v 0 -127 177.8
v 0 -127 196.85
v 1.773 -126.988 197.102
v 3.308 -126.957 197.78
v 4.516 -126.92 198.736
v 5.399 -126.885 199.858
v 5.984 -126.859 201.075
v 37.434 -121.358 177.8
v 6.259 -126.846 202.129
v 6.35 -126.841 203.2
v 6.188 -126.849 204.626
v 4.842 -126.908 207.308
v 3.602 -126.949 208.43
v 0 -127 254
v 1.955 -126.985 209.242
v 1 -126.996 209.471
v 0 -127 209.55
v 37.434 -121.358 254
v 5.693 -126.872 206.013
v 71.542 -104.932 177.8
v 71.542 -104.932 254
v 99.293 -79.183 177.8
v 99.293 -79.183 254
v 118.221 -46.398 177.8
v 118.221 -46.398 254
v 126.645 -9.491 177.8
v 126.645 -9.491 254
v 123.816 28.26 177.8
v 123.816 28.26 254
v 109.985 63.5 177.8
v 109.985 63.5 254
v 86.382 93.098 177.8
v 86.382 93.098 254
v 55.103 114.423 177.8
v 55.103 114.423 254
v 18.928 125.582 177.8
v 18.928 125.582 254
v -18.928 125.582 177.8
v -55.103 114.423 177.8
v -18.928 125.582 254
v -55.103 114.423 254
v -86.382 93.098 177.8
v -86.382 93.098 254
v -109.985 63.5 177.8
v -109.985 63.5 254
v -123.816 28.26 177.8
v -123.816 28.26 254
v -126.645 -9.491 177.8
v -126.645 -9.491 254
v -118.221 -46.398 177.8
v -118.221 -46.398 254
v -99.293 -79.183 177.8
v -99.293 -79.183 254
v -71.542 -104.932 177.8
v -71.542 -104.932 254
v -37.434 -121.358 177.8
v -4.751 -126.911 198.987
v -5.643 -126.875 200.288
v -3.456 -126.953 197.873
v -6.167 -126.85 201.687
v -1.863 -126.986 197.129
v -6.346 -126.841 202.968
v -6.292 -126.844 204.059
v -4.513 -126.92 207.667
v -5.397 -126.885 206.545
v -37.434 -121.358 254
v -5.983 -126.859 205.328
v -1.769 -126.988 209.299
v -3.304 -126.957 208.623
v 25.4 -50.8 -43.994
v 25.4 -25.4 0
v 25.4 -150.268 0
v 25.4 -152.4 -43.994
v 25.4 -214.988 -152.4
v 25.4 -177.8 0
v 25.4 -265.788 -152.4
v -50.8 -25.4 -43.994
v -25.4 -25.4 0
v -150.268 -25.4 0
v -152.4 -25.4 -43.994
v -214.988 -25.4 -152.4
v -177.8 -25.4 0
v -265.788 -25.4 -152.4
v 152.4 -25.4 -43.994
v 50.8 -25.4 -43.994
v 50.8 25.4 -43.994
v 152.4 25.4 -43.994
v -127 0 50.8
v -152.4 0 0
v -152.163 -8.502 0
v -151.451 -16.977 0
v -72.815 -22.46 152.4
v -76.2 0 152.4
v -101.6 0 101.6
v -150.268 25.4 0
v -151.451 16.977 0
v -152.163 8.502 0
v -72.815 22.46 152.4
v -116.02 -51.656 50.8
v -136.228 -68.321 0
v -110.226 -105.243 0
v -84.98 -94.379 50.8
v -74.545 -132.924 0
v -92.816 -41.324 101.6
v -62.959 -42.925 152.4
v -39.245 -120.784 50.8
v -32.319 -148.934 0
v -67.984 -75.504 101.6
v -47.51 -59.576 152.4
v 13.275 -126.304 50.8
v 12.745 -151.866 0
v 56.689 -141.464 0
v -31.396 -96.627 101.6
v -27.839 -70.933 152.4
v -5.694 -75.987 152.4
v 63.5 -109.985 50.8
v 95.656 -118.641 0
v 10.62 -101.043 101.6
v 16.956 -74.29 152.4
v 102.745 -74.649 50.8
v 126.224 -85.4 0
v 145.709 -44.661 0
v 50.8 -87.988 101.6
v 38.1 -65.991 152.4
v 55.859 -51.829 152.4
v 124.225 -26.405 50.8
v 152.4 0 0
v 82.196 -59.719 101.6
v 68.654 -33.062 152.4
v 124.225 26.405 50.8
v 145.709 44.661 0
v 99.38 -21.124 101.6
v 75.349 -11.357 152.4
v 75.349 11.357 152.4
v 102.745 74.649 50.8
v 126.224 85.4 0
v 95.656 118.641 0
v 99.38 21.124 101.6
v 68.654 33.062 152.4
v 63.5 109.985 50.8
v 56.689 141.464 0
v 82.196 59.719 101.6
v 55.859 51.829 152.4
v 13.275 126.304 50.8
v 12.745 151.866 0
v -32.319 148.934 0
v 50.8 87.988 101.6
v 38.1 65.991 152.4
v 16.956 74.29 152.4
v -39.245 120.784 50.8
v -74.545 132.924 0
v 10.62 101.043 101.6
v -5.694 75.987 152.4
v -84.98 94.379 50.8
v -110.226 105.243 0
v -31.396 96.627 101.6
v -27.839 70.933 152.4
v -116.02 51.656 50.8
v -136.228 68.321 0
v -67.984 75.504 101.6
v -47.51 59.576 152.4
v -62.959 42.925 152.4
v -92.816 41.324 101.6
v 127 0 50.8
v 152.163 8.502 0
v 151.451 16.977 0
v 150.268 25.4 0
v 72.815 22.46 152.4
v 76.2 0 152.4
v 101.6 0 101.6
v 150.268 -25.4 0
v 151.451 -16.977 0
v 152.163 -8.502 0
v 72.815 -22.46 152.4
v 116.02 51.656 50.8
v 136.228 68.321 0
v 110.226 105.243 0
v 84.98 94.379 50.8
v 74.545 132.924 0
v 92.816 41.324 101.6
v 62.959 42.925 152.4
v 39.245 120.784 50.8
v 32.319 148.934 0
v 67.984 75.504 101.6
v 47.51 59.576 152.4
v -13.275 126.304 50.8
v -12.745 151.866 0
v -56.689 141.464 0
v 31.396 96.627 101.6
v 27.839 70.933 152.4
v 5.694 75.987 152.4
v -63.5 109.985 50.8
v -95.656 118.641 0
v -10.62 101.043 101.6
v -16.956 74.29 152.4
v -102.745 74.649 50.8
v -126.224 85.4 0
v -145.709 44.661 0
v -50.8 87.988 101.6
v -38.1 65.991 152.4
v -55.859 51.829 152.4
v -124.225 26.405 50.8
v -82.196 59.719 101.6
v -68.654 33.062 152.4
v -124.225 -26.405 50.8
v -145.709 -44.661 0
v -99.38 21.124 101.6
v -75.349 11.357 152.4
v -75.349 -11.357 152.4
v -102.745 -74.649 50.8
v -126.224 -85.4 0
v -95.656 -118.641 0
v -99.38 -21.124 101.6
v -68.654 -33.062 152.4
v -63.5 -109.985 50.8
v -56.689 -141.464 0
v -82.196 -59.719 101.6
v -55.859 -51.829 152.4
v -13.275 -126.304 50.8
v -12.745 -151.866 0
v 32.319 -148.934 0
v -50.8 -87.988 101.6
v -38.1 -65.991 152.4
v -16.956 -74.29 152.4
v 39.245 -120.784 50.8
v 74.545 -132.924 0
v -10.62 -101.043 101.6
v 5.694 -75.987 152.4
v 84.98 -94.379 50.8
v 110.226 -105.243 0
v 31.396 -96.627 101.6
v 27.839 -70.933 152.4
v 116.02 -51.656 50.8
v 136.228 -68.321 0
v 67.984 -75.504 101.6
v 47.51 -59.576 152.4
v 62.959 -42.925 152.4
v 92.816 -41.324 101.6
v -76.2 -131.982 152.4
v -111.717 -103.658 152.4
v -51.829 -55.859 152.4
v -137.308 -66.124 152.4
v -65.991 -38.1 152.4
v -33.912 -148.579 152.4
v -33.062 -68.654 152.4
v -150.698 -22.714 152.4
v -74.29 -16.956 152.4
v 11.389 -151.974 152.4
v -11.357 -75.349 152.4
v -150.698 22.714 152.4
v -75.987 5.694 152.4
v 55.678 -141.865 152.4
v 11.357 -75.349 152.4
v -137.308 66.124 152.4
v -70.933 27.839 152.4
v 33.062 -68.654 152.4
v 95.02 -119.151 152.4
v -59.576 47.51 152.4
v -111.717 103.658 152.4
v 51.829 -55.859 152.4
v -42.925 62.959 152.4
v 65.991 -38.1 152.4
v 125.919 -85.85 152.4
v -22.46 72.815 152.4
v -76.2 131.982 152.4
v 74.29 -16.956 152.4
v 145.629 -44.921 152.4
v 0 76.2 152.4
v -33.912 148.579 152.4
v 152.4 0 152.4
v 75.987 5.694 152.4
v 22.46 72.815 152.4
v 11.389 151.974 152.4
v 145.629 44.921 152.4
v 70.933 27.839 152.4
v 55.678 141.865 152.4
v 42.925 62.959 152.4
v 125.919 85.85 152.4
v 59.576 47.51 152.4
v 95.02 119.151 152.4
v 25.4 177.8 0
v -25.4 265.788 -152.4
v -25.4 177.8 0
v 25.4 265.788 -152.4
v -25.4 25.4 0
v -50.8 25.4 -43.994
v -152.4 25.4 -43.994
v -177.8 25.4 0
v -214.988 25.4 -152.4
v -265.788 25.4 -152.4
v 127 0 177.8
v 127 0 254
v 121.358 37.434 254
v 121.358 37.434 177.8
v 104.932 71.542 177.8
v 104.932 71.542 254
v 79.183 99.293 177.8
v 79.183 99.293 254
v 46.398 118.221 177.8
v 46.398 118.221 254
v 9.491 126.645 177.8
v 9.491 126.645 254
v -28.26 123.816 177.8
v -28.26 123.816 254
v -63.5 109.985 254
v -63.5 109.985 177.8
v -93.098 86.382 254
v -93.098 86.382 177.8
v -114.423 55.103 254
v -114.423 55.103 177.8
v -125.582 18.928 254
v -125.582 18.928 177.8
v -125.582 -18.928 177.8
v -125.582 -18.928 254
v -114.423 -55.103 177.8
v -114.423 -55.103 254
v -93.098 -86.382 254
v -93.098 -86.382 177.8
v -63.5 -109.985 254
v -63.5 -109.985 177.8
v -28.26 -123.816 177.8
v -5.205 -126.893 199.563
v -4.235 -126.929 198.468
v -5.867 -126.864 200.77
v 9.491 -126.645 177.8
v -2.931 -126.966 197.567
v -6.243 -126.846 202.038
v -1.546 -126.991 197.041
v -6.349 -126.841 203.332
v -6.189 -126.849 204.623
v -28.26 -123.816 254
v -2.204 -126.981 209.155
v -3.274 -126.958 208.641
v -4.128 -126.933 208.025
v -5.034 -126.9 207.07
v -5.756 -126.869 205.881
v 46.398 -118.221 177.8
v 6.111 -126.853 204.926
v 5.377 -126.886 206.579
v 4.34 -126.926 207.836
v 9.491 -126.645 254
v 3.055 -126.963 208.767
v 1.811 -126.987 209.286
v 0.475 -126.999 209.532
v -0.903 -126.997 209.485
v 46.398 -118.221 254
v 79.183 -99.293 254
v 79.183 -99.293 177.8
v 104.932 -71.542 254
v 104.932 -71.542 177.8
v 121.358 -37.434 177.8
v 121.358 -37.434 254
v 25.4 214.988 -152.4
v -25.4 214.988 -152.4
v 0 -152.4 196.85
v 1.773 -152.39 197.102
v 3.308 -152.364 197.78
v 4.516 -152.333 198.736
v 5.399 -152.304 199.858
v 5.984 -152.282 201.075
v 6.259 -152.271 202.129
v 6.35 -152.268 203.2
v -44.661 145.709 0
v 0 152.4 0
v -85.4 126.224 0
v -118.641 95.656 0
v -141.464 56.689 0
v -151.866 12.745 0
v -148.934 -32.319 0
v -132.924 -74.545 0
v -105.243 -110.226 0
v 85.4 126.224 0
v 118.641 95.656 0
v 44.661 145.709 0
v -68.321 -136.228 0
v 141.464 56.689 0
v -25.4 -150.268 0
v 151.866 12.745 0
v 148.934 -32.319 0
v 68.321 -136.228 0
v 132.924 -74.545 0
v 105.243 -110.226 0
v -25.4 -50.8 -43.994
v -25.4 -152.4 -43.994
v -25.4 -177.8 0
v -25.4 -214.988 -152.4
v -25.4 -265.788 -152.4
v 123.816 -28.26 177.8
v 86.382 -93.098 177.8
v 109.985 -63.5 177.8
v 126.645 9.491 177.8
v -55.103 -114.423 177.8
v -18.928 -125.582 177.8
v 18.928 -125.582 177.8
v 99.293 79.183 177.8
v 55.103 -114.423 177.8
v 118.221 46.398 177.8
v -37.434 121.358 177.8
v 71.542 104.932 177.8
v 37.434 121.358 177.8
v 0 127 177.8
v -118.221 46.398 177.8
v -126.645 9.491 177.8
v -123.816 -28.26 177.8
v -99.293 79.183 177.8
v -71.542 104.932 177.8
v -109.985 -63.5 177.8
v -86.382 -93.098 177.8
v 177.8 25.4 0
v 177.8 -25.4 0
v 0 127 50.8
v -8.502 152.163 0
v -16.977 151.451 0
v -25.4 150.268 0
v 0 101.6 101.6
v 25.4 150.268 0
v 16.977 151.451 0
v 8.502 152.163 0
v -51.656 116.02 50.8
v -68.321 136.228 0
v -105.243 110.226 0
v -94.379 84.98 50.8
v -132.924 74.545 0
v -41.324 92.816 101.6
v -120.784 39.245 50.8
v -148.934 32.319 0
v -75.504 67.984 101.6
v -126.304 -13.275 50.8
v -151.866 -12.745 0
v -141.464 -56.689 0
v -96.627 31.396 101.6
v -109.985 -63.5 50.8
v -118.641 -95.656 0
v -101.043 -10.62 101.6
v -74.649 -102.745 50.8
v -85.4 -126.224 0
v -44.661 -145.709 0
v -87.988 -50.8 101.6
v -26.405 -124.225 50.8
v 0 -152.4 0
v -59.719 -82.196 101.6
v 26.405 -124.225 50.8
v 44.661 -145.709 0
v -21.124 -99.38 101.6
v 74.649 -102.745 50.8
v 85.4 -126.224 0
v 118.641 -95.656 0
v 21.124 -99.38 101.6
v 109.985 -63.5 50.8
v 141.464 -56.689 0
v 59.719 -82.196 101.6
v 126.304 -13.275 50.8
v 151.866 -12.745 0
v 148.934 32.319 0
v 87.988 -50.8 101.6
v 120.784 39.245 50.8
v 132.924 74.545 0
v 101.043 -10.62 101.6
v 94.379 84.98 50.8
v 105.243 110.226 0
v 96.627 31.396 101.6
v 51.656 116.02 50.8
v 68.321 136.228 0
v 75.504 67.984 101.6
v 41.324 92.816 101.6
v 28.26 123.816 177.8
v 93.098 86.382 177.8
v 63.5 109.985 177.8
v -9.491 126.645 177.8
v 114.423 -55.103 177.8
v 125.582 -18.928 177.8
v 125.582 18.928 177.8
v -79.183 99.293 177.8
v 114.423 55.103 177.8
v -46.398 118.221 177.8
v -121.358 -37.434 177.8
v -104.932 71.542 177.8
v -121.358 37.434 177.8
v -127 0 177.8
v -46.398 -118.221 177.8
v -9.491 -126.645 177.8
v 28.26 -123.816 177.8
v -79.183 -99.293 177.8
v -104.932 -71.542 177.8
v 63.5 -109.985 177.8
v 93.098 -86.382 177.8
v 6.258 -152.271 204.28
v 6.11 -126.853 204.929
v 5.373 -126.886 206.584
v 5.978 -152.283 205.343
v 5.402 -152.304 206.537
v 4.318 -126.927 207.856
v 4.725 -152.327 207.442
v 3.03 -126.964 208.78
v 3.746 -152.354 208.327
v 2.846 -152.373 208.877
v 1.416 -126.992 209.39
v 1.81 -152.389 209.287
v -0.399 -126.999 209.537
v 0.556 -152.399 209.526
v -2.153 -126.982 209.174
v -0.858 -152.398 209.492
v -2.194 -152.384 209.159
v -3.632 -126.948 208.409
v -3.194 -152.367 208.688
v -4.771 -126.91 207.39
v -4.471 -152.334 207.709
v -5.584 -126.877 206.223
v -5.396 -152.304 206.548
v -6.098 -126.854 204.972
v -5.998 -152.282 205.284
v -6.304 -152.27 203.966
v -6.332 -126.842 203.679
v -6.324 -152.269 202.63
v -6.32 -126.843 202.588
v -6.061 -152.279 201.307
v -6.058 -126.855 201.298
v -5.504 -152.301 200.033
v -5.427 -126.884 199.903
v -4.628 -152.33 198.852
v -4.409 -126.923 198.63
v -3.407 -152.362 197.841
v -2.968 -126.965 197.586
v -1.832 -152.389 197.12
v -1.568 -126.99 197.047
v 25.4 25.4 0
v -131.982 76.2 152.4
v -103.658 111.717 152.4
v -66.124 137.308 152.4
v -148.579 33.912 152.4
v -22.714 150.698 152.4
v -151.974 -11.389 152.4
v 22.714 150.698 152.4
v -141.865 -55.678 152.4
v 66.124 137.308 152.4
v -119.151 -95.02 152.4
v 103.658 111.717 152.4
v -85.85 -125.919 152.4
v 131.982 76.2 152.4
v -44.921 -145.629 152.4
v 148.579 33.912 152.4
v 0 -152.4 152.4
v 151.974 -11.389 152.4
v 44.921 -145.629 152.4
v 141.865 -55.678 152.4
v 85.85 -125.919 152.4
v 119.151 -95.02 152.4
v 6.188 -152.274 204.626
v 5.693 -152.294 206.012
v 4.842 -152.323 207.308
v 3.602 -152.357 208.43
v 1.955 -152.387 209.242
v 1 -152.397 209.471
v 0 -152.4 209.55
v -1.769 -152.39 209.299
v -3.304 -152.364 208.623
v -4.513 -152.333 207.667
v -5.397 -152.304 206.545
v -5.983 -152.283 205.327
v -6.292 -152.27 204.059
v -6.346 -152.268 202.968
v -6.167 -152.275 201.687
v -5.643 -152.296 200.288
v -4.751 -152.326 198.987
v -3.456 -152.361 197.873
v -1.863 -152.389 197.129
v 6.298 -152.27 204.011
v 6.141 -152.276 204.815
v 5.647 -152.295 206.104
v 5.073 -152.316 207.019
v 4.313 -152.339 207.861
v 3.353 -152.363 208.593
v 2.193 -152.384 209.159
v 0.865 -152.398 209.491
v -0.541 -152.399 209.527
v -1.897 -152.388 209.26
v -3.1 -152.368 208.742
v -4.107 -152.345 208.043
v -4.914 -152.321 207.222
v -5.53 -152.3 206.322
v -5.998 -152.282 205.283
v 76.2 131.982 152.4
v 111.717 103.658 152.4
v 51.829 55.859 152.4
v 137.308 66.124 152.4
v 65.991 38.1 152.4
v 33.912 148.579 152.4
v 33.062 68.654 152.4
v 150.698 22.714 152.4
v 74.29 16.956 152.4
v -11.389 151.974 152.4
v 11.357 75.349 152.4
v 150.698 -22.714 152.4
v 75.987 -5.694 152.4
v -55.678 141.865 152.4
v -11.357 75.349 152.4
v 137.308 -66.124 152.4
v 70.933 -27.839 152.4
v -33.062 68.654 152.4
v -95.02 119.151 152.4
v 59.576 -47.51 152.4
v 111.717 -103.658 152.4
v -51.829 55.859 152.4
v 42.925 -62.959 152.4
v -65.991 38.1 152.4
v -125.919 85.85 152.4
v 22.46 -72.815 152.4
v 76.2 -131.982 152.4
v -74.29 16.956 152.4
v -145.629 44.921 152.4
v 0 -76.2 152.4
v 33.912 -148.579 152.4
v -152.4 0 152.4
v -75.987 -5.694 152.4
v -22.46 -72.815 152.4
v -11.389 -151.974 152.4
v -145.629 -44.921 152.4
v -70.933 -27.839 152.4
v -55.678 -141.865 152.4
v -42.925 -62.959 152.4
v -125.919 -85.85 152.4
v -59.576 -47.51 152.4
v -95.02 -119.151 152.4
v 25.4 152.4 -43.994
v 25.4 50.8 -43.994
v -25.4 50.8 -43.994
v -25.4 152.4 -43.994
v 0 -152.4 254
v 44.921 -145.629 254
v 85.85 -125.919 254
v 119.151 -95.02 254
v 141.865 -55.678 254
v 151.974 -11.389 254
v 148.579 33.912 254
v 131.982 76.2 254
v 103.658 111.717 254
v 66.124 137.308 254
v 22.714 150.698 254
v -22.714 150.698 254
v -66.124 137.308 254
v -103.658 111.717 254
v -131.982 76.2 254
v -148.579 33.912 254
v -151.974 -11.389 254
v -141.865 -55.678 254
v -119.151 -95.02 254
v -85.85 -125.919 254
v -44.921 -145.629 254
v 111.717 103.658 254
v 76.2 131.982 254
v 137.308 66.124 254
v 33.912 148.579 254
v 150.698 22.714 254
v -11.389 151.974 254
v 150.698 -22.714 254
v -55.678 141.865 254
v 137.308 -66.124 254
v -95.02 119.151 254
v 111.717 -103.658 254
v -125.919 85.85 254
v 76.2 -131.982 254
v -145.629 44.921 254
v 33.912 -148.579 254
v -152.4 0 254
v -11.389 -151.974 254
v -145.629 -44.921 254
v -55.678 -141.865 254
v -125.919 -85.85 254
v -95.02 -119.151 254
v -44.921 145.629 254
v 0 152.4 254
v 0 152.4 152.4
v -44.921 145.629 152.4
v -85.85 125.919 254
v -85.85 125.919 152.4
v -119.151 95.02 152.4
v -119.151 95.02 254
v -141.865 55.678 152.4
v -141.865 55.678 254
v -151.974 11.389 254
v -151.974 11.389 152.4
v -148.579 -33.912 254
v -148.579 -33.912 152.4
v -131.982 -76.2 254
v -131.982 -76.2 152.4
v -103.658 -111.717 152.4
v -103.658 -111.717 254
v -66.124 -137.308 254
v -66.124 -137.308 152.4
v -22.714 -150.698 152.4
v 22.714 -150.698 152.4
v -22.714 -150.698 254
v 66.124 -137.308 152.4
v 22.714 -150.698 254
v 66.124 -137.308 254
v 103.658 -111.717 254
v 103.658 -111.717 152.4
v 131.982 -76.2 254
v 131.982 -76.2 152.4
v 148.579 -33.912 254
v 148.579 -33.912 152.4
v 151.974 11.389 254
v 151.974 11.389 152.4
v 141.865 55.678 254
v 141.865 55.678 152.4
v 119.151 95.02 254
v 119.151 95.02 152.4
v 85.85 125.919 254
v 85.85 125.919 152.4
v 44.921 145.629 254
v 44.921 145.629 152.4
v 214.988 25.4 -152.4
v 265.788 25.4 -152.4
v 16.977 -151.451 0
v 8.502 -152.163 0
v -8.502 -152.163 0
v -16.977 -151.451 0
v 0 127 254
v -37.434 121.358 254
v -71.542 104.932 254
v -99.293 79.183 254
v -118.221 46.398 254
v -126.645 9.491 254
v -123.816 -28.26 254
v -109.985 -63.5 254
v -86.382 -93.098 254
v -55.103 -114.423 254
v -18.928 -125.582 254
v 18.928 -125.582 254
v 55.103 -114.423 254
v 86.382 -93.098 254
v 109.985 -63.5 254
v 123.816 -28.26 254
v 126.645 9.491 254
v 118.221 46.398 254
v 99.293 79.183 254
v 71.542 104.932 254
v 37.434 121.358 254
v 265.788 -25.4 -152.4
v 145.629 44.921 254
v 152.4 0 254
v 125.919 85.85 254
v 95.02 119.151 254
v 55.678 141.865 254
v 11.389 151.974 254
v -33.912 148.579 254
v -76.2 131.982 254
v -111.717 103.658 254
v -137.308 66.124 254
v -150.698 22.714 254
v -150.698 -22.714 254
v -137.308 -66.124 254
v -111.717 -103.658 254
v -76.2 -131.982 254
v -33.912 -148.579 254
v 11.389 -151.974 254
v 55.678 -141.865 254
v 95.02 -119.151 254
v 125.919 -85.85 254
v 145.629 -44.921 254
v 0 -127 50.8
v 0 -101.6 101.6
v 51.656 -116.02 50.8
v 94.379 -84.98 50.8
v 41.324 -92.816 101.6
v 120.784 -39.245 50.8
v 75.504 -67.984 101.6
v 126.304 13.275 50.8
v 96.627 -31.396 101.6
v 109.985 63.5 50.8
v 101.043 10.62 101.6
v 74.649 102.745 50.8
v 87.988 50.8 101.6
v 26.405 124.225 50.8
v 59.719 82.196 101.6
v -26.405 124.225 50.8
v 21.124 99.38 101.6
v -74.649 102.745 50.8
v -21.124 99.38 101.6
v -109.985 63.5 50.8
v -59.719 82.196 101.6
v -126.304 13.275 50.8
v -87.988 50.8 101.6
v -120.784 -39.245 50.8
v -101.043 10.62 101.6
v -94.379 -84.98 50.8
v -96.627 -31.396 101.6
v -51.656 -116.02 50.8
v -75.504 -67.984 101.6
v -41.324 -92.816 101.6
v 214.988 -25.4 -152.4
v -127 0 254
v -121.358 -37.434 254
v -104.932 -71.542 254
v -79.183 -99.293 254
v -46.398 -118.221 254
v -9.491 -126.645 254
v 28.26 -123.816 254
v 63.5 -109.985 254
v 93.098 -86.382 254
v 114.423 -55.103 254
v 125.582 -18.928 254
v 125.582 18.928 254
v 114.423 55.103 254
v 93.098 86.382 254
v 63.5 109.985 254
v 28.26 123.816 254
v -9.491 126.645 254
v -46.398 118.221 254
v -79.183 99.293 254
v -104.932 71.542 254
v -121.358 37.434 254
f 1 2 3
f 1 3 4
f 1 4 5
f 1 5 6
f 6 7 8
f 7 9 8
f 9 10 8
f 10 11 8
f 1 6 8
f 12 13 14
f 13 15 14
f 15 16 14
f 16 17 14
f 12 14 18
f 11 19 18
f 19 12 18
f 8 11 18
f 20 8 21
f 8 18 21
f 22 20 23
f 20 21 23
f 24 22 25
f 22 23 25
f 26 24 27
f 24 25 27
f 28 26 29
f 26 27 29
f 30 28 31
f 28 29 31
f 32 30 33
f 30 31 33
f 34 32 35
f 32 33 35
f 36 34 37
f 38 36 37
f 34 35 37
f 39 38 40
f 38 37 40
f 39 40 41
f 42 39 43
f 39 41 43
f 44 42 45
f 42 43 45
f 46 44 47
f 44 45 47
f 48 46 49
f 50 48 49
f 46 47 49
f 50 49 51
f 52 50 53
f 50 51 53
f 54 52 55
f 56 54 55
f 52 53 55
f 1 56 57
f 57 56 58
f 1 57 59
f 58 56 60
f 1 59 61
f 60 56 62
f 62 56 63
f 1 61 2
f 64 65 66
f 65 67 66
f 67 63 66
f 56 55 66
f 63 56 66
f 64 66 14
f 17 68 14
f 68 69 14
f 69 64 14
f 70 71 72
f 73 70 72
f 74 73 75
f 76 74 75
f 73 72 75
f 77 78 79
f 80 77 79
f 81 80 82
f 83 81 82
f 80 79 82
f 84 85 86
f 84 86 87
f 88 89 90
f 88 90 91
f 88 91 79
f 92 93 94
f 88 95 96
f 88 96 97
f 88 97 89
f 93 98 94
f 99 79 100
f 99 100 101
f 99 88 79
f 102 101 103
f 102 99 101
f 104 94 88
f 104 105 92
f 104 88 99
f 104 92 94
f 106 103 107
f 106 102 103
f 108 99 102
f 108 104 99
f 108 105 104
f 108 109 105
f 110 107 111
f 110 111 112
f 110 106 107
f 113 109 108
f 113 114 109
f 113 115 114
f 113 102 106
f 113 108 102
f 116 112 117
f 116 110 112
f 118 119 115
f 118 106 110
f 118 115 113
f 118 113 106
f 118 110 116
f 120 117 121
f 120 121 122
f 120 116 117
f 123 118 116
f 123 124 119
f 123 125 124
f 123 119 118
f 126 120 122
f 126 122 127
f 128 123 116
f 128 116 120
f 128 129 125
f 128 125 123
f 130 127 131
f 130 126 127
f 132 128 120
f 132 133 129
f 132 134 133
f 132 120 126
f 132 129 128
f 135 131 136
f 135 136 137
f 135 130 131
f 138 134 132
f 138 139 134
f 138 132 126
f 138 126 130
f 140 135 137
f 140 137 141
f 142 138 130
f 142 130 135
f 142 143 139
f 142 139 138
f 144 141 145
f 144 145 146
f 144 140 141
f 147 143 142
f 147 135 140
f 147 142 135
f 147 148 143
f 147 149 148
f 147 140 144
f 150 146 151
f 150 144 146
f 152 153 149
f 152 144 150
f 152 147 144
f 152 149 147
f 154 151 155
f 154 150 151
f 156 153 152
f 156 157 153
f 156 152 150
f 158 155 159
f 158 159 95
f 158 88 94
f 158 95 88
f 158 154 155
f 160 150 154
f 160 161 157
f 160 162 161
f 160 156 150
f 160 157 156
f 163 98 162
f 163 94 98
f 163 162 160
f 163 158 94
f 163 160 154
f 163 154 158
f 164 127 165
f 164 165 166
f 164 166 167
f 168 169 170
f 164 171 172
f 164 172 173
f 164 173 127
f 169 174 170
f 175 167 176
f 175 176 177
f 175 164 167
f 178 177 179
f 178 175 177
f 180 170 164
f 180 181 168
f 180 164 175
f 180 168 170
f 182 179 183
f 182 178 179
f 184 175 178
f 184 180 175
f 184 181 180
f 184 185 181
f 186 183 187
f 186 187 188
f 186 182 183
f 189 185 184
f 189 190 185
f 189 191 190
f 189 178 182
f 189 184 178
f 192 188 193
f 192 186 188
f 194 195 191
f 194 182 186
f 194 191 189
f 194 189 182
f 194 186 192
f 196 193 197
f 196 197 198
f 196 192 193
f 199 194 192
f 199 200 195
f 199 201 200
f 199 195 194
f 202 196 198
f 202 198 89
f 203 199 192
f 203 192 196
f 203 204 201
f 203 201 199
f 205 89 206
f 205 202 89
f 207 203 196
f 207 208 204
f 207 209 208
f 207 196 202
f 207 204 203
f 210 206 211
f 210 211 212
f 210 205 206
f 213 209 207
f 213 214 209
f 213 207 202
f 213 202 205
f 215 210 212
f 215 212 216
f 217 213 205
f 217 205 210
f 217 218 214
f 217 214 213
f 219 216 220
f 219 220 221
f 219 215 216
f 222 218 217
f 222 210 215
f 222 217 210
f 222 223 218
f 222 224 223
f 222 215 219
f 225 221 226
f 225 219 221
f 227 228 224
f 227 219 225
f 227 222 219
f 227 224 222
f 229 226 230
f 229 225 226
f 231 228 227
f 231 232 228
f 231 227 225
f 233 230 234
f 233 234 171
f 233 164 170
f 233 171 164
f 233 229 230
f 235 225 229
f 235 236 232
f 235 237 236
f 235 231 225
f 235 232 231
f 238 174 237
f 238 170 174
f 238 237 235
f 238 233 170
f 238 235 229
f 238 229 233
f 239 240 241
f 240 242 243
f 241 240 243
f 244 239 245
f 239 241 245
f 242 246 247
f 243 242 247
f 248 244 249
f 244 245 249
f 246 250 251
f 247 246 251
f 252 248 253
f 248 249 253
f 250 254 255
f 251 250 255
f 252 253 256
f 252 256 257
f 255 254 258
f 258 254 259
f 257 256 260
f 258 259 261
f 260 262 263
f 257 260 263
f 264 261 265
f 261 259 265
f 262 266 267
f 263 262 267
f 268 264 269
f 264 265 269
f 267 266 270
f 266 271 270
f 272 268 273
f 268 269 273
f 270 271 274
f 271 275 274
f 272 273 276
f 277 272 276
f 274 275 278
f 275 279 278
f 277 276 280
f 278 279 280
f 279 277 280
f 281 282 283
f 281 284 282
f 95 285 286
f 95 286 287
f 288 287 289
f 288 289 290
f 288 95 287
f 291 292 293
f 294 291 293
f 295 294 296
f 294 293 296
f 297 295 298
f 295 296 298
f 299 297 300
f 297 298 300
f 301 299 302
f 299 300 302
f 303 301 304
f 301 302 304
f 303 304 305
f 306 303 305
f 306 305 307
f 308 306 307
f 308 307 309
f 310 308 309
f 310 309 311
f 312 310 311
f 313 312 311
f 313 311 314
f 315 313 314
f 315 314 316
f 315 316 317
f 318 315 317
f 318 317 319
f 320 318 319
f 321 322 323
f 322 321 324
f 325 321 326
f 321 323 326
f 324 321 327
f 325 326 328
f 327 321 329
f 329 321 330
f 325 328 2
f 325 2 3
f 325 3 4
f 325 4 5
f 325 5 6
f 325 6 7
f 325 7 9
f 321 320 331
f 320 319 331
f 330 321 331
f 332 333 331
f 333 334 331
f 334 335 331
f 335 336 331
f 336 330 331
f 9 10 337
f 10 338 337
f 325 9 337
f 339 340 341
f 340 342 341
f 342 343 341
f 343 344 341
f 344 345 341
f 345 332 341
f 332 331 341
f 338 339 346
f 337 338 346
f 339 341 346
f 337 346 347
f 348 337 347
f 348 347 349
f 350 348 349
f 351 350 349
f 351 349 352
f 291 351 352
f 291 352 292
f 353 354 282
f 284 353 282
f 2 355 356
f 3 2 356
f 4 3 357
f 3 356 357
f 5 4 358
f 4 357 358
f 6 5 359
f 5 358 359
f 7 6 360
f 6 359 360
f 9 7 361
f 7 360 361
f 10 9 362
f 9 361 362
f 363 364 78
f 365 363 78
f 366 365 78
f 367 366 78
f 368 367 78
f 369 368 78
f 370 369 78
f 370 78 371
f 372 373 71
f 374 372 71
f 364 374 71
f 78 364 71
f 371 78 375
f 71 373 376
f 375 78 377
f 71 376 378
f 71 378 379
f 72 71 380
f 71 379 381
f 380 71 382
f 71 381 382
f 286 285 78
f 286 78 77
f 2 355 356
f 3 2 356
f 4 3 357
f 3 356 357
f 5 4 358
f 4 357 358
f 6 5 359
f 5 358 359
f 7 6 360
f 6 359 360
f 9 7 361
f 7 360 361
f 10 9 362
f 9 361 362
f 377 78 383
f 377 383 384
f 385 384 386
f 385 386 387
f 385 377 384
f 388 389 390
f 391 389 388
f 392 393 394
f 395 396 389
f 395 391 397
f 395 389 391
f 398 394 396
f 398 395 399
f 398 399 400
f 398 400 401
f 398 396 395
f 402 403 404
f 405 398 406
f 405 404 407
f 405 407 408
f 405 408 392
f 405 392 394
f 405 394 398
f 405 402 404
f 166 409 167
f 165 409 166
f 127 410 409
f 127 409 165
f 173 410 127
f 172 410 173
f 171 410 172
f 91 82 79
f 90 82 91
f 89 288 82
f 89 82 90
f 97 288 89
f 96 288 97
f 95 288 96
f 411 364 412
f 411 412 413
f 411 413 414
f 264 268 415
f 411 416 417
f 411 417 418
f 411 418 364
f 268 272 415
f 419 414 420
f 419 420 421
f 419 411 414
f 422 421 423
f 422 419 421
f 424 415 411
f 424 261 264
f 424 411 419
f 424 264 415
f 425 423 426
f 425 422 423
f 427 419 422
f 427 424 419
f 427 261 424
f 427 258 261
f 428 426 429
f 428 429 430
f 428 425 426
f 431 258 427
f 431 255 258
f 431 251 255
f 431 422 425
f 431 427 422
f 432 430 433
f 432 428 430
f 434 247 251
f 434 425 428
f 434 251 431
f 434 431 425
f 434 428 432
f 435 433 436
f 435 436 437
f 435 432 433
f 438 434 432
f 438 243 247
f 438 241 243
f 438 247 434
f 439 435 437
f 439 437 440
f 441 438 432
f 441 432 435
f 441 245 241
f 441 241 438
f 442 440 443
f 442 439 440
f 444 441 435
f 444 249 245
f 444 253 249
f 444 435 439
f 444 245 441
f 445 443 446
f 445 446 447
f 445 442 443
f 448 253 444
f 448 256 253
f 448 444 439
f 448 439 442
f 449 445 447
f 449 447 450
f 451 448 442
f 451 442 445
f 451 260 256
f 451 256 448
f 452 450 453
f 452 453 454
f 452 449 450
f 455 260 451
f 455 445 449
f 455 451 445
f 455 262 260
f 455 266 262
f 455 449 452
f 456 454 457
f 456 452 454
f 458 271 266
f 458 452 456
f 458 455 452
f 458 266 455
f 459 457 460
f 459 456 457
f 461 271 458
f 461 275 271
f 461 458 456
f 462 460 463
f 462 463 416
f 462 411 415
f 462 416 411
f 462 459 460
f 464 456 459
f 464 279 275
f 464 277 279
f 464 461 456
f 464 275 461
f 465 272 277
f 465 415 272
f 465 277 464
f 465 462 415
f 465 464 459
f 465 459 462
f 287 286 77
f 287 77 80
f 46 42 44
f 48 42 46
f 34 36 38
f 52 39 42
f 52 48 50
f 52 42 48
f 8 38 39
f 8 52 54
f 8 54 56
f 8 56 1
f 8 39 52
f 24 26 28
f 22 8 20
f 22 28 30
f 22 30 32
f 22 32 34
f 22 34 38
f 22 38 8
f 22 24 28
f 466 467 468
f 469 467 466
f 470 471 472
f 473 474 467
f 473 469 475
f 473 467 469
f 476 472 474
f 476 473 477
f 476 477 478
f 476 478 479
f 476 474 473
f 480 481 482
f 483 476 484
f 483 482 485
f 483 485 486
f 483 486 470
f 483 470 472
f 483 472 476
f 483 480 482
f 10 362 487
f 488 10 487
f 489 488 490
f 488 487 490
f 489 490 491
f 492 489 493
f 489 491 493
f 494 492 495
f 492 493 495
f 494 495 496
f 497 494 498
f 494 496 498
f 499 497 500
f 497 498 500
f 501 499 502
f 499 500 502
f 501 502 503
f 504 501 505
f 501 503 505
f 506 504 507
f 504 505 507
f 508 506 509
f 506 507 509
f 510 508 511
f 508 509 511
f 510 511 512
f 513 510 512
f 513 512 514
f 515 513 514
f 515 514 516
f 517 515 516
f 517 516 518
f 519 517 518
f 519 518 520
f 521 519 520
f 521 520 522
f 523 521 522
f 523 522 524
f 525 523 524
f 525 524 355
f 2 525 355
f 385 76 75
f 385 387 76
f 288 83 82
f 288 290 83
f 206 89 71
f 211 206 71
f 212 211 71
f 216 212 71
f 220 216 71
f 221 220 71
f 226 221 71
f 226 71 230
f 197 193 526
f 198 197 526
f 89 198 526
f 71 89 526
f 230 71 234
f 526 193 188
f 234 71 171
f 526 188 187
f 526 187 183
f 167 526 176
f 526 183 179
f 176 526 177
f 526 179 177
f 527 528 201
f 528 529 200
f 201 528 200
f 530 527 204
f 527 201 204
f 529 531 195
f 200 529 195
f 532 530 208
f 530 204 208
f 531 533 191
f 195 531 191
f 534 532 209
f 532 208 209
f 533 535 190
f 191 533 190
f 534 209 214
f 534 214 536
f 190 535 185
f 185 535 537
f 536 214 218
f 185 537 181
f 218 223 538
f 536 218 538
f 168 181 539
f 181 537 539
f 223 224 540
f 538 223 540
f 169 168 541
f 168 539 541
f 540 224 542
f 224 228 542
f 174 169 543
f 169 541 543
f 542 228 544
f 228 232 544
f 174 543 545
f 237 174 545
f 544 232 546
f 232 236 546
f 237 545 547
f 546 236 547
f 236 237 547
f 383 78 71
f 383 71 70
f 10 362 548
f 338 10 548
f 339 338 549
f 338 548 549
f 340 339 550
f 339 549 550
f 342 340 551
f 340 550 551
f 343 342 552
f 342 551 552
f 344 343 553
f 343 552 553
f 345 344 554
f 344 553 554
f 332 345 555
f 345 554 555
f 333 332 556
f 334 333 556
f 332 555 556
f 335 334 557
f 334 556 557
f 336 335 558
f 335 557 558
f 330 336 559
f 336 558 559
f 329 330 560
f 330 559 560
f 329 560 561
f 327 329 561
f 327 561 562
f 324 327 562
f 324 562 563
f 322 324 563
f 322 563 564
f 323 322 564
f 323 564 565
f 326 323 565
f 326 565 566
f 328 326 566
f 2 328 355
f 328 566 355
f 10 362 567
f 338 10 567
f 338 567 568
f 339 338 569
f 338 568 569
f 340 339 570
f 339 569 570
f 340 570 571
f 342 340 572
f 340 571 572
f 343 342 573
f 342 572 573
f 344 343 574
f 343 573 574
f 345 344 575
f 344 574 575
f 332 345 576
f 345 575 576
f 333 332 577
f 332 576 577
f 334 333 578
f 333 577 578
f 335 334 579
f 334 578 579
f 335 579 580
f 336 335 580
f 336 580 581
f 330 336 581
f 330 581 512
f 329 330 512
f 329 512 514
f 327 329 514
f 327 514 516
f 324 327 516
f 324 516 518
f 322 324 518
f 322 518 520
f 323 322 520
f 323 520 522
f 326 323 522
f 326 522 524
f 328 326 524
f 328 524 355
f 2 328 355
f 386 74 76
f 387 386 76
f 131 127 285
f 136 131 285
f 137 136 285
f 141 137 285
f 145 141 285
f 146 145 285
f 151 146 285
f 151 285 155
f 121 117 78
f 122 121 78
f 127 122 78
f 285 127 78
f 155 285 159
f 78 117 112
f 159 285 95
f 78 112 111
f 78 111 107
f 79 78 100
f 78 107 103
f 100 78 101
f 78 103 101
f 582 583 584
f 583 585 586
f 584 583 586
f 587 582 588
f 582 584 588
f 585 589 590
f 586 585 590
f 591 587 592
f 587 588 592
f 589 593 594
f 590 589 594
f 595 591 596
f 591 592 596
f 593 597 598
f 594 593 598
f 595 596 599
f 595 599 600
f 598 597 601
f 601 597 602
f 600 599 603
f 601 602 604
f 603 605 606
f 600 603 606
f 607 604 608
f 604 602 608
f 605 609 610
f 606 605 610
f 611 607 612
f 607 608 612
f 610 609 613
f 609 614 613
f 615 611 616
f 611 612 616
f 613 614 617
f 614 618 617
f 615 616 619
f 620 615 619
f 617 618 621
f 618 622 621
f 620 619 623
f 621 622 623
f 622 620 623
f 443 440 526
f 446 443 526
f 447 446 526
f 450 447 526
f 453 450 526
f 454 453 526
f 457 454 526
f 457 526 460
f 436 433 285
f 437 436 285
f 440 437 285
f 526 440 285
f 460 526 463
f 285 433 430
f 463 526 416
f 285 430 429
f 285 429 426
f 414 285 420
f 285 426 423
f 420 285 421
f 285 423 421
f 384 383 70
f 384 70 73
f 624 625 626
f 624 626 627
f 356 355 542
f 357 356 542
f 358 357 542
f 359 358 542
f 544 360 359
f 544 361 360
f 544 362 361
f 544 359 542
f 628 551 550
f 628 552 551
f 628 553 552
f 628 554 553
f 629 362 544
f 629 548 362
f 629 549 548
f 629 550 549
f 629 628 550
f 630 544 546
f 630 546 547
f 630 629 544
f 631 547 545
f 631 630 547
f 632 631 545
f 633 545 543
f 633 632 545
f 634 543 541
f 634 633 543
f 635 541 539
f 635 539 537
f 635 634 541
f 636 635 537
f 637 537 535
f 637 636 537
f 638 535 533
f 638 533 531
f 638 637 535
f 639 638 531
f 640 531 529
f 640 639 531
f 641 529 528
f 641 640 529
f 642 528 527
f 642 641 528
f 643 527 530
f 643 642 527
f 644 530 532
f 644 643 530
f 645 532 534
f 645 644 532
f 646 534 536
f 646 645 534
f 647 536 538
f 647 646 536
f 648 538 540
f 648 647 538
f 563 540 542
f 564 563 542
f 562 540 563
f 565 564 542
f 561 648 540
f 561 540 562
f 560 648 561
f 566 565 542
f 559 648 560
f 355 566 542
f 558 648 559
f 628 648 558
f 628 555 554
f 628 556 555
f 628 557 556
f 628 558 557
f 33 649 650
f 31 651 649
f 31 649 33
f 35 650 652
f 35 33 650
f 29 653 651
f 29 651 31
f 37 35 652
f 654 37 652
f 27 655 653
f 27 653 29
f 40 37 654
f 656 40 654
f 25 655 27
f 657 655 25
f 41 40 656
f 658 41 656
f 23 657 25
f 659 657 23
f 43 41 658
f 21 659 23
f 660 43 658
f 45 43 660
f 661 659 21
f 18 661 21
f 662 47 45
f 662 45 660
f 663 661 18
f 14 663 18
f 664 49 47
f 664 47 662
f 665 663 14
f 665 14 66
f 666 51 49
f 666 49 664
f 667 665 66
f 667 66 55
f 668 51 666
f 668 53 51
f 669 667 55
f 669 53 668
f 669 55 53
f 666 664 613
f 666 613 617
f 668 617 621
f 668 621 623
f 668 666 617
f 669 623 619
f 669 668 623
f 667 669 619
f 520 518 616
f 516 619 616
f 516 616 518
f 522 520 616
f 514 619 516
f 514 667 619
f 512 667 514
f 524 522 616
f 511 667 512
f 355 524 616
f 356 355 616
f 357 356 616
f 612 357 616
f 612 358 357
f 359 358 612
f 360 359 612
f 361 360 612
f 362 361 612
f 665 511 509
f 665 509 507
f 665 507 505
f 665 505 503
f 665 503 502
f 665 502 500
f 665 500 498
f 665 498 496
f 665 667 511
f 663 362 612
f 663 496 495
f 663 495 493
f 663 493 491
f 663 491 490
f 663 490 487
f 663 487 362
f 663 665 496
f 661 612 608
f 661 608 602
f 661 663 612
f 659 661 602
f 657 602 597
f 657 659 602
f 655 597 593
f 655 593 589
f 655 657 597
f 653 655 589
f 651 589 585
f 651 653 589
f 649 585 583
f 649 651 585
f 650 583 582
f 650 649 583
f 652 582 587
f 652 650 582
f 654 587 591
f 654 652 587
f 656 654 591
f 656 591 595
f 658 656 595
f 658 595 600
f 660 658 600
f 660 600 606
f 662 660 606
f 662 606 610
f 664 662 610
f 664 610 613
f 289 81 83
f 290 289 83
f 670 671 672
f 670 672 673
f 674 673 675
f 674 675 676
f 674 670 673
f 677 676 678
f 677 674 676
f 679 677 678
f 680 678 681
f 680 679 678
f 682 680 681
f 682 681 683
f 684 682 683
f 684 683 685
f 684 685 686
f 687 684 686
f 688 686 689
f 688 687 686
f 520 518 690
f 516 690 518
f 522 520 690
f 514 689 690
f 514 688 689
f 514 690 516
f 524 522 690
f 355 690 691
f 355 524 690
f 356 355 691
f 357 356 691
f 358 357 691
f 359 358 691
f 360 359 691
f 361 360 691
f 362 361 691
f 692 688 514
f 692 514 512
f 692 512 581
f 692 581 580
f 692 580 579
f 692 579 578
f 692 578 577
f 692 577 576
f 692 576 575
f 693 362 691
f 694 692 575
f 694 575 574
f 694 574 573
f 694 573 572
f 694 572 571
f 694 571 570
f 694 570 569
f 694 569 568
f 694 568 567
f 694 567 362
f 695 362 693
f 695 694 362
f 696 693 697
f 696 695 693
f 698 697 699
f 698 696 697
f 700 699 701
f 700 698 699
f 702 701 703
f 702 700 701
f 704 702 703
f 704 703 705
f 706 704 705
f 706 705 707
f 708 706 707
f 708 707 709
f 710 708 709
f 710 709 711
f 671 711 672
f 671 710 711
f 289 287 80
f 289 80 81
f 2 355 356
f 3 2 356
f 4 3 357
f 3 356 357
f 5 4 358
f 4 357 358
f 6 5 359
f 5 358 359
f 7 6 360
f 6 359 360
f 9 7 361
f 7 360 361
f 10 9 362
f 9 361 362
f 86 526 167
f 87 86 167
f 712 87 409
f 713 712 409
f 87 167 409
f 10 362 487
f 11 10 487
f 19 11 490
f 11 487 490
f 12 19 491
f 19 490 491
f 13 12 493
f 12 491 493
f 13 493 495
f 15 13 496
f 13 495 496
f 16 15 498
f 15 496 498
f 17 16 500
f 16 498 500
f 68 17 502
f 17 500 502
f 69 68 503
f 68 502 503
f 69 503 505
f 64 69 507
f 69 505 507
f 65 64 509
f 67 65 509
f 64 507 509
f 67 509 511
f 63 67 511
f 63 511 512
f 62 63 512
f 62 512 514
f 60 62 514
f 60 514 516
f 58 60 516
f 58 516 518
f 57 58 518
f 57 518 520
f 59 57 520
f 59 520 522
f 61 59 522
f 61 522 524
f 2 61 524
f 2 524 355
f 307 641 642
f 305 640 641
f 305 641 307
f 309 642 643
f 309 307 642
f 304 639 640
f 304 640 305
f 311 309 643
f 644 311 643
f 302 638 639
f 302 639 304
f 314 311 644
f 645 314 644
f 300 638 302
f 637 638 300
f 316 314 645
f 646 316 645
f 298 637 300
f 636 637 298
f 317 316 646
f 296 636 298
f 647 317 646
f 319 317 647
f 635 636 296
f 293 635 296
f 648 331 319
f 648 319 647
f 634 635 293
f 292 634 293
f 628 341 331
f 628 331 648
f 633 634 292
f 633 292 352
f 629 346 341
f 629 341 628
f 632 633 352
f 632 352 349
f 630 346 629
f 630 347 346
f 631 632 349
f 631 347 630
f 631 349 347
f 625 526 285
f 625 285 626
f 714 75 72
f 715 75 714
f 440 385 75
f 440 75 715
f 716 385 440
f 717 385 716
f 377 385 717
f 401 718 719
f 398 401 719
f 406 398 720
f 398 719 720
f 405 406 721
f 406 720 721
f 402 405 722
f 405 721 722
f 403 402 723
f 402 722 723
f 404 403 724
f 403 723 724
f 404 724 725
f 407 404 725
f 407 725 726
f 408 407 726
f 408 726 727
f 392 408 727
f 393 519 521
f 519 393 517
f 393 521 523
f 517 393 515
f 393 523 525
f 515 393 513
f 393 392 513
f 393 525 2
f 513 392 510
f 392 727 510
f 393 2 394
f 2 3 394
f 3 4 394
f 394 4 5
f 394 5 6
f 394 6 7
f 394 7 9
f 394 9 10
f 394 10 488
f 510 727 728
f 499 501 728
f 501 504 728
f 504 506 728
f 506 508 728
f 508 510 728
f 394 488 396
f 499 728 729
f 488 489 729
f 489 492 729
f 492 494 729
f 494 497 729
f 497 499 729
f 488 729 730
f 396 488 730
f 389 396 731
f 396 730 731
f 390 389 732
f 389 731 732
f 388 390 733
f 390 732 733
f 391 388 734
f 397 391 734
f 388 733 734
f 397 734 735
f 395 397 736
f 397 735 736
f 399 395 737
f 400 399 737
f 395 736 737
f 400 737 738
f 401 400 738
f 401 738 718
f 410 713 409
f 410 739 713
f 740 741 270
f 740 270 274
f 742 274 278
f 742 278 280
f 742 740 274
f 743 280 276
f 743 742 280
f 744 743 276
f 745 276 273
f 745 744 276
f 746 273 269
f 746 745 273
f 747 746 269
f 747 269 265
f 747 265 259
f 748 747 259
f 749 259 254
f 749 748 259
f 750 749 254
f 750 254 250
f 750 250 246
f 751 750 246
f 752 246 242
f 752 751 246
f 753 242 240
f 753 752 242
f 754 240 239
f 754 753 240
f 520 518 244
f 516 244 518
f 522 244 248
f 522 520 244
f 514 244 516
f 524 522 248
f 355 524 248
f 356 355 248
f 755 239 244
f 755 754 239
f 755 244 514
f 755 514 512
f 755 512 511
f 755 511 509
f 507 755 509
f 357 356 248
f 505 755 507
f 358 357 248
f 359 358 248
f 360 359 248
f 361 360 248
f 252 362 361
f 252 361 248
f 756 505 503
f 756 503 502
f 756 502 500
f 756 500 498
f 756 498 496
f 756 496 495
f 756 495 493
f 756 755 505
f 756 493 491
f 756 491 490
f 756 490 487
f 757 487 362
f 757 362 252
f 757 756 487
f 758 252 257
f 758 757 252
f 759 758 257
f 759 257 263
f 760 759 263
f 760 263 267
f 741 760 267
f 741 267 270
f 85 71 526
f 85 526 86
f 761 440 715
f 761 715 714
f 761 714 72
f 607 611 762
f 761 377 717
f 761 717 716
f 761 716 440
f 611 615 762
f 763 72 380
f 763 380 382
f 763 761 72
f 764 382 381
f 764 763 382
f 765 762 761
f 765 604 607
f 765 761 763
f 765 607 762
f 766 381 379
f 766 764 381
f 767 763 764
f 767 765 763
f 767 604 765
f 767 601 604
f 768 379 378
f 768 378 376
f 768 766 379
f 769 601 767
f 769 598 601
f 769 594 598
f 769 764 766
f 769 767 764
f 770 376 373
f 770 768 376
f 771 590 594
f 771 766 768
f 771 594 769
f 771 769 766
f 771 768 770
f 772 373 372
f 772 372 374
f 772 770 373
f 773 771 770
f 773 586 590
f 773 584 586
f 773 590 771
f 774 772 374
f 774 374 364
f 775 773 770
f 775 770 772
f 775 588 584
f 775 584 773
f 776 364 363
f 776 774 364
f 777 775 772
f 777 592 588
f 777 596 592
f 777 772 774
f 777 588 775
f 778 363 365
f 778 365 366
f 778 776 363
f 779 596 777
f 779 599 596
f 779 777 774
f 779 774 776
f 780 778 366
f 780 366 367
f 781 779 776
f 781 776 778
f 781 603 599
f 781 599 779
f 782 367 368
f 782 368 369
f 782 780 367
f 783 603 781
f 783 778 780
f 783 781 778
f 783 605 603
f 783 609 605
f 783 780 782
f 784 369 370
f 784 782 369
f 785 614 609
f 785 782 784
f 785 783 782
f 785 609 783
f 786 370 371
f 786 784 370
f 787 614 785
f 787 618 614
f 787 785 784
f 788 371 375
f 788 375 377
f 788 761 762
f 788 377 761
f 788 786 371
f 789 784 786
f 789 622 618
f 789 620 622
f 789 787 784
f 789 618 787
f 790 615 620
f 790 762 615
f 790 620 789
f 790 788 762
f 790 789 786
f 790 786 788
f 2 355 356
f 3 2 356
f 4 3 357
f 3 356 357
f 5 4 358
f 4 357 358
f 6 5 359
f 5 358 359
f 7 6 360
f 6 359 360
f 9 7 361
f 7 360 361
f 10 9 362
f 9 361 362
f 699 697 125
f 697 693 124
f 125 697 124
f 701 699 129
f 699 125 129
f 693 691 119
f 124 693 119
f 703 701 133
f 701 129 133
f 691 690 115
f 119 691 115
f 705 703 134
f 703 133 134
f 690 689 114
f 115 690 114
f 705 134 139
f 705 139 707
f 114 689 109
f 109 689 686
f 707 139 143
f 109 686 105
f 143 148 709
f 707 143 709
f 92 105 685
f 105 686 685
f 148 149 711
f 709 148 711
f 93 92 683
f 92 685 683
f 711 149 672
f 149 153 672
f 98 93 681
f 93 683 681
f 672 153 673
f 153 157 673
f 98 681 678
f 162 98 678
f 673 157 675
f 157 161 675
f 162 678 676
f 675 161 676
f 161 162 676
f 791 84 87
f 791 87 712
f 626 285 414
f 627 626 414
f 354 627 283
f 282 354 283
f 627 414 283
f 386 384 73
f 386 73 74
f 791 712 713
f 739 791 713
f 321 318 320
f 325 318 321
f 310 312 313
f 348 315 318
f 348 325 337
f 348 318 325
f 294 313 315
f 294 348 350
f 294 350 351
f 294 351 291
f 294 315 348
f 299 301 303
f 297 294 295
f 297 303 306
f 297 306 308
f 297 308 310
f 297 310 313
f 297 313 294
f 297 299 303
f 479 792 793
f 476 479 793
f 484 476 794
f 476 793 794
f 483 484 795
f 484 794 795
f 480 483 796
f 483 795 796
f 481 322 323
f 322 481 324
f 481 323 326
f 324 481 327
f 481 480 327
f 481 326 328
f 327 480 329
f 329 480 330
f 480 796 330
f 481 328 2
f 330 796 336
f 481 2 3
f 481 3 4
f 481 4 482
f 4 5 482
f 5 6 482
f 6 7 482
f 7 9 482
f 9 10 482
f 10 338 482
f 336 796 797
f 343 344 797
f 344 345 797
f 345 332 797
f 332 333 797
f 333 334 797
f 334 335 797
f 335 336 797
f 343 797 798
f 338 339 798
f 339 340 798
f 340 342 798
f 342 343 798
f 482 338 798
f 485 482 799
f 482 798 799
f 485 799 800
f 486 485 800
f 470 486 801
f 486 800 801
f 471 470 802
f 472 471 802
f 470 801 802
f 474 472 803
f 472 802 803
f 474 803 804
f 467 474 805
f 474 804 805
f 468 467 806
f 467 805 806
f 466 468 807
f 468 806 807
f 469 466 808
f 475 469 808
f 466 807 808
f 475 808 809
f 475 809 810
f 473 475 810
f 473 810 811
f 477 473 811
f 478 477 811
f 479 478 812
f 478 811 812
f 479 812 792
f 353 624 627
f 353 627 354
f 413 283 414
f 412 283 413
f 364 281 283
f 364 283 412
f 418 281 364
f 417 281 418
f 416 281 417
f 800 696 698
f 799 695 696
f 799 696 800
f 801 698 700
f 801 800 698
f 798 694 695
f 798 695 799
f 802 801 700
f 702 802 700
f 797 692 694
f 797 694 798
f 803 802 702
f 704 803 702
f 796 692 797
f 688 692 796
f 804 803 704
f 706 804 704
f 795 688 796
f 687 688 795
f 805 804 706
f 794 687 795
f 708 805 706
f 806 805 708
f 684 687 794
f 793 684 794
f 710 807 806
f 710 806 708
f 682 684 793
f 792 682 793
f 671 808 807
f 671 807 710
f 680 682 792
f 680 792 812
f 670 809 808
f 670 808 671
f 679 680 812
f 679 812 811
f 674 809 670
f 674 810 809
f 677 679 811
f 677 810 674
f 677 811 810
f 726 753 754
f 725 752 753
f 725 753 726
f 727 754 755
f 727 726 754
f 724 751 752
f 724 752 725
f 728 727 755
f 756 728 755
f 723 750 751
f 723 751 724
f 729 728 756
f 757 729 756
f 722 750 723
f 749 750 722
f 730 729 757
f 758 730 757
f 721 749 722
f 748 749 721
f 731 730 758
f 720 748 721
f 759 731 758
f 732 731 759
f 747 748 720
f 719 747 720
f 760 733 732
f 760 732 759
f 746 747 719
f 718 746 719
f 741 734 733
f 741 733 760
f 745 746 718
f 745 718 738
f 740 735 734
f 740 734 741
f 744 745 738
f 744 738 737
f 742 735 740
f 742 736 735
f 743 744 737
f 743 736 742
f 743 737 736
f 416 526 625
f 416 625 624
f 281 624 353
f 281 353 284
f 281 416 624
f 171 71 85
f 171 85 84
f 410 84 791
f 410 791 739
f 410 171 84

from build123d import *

# Parameters (mm, degrees)
F0_R      = 152.4
F2_R      = 76.2
F5_W      = 152.4
F5_H      = 101.6
F7_R      = 127
F8_DEPTH  = 76.2
F10_DEPTH = 25.4
F11_COUNT = 4
F14_DEPTH = 50.8


with BuildPart() as f3:
    # F0 (on Top) → F3 section 0
    with BuildSketch(Plane.XY):
        Circle(F0_R)
    # F2 (on offset) → F3 section 1
    with BuildSketch(Plane.XY.offset(152.4)):
        Circle(F2_R)
    loft()

    # F5 (on Right) → F6 (revolve)
    with BuildSketch(Plane.YZ):
        with Locations((-76.2, 203.2)):
            Rectangle(F5_W, F5_H)
    revolve(axis=Axis((0, 0, 203.2), (0, 0, 1)))

    # F7 (on face) → F8 (cut)
    with BuildSketch(Plane.XY.offset(254)):
        Circle(F7_R)
    extrude(amount=-F8_DEPTH, mode=Mode.SUBTRACT)

    # F9 (on Front) → F10 (join, symmetric)
    with BuildSketch(Plane.XZ):
        Polygon((177.8, 0), (25.4, 0), (50.8, -43.9940905122), (152.4, -43.9940905122), (214.9881810245, -152.4), (265.7881810245, -152.4), align=None)
    extrude(amount=F10_DEPTH, both=True)


with BuildPart() as f11_1:
    # F11: instance of F3
    add(f3.part.rotate(Axis((0, 0, 0), (0, 0, 1)), 1 * 360 / F11_COUNT))


with BuildPart() as f11_2:
    # F11: instance of F3
    add(f3.part.rotate(Axis((0, 0, 0), (0, 0, 1)), 2 * 360 / F11_COUNT))


with BuildPart() as f11_3:
    # F11: instance of F3
    add(f3.part.rotate(Axis((0, 0, 0), (0, 0, 1)), 3 * 360 / F11_COUNT))


with BuildPart() as f14_tool:
    # F13 (on offset) → F14 (new body)
    with BuildSketch(Plane.XZ.offset(152.4)):
        with BuildLine():
            ThreePointArc((0, 196.85), (4.4901280605, 198.7098719395), (6.35, 203.2))
            ThreePointArc((6.35, 203.2), (-4.4901280605, 207.6901280605), (0, 196.85))
        make_face()
    extrude(amount=-F14_DEPTH)


with BuildPart() as f3_1:
    add(f3.part)

    # F14: cut by f14_tool
    add(f14_tool.part, mode=Mode.SUBTRACT)


with BuildPart() as f11_1_1:
    add(f11_1.part)

    # F14: cut by f14_tool
    add(f14_tool.part, mode=Mode.SUBTRACT)


with BuildPart() as f11_2_1:
    add(f11_2.part)

    # F14: cut by f14_tool
    add(f14_tool.part, mode=Mode.SUBTRACT)


with BuildPart() as f11_3_1:
    add(f11_3.part)

    # F14: cut by f14_tool
    add(f14_tool.part, mode=Mode.SUBTRACT)


solid = Compound([f3_1.part, f11_1_1.part, f11_2_1.part, f11_3_1.part])
